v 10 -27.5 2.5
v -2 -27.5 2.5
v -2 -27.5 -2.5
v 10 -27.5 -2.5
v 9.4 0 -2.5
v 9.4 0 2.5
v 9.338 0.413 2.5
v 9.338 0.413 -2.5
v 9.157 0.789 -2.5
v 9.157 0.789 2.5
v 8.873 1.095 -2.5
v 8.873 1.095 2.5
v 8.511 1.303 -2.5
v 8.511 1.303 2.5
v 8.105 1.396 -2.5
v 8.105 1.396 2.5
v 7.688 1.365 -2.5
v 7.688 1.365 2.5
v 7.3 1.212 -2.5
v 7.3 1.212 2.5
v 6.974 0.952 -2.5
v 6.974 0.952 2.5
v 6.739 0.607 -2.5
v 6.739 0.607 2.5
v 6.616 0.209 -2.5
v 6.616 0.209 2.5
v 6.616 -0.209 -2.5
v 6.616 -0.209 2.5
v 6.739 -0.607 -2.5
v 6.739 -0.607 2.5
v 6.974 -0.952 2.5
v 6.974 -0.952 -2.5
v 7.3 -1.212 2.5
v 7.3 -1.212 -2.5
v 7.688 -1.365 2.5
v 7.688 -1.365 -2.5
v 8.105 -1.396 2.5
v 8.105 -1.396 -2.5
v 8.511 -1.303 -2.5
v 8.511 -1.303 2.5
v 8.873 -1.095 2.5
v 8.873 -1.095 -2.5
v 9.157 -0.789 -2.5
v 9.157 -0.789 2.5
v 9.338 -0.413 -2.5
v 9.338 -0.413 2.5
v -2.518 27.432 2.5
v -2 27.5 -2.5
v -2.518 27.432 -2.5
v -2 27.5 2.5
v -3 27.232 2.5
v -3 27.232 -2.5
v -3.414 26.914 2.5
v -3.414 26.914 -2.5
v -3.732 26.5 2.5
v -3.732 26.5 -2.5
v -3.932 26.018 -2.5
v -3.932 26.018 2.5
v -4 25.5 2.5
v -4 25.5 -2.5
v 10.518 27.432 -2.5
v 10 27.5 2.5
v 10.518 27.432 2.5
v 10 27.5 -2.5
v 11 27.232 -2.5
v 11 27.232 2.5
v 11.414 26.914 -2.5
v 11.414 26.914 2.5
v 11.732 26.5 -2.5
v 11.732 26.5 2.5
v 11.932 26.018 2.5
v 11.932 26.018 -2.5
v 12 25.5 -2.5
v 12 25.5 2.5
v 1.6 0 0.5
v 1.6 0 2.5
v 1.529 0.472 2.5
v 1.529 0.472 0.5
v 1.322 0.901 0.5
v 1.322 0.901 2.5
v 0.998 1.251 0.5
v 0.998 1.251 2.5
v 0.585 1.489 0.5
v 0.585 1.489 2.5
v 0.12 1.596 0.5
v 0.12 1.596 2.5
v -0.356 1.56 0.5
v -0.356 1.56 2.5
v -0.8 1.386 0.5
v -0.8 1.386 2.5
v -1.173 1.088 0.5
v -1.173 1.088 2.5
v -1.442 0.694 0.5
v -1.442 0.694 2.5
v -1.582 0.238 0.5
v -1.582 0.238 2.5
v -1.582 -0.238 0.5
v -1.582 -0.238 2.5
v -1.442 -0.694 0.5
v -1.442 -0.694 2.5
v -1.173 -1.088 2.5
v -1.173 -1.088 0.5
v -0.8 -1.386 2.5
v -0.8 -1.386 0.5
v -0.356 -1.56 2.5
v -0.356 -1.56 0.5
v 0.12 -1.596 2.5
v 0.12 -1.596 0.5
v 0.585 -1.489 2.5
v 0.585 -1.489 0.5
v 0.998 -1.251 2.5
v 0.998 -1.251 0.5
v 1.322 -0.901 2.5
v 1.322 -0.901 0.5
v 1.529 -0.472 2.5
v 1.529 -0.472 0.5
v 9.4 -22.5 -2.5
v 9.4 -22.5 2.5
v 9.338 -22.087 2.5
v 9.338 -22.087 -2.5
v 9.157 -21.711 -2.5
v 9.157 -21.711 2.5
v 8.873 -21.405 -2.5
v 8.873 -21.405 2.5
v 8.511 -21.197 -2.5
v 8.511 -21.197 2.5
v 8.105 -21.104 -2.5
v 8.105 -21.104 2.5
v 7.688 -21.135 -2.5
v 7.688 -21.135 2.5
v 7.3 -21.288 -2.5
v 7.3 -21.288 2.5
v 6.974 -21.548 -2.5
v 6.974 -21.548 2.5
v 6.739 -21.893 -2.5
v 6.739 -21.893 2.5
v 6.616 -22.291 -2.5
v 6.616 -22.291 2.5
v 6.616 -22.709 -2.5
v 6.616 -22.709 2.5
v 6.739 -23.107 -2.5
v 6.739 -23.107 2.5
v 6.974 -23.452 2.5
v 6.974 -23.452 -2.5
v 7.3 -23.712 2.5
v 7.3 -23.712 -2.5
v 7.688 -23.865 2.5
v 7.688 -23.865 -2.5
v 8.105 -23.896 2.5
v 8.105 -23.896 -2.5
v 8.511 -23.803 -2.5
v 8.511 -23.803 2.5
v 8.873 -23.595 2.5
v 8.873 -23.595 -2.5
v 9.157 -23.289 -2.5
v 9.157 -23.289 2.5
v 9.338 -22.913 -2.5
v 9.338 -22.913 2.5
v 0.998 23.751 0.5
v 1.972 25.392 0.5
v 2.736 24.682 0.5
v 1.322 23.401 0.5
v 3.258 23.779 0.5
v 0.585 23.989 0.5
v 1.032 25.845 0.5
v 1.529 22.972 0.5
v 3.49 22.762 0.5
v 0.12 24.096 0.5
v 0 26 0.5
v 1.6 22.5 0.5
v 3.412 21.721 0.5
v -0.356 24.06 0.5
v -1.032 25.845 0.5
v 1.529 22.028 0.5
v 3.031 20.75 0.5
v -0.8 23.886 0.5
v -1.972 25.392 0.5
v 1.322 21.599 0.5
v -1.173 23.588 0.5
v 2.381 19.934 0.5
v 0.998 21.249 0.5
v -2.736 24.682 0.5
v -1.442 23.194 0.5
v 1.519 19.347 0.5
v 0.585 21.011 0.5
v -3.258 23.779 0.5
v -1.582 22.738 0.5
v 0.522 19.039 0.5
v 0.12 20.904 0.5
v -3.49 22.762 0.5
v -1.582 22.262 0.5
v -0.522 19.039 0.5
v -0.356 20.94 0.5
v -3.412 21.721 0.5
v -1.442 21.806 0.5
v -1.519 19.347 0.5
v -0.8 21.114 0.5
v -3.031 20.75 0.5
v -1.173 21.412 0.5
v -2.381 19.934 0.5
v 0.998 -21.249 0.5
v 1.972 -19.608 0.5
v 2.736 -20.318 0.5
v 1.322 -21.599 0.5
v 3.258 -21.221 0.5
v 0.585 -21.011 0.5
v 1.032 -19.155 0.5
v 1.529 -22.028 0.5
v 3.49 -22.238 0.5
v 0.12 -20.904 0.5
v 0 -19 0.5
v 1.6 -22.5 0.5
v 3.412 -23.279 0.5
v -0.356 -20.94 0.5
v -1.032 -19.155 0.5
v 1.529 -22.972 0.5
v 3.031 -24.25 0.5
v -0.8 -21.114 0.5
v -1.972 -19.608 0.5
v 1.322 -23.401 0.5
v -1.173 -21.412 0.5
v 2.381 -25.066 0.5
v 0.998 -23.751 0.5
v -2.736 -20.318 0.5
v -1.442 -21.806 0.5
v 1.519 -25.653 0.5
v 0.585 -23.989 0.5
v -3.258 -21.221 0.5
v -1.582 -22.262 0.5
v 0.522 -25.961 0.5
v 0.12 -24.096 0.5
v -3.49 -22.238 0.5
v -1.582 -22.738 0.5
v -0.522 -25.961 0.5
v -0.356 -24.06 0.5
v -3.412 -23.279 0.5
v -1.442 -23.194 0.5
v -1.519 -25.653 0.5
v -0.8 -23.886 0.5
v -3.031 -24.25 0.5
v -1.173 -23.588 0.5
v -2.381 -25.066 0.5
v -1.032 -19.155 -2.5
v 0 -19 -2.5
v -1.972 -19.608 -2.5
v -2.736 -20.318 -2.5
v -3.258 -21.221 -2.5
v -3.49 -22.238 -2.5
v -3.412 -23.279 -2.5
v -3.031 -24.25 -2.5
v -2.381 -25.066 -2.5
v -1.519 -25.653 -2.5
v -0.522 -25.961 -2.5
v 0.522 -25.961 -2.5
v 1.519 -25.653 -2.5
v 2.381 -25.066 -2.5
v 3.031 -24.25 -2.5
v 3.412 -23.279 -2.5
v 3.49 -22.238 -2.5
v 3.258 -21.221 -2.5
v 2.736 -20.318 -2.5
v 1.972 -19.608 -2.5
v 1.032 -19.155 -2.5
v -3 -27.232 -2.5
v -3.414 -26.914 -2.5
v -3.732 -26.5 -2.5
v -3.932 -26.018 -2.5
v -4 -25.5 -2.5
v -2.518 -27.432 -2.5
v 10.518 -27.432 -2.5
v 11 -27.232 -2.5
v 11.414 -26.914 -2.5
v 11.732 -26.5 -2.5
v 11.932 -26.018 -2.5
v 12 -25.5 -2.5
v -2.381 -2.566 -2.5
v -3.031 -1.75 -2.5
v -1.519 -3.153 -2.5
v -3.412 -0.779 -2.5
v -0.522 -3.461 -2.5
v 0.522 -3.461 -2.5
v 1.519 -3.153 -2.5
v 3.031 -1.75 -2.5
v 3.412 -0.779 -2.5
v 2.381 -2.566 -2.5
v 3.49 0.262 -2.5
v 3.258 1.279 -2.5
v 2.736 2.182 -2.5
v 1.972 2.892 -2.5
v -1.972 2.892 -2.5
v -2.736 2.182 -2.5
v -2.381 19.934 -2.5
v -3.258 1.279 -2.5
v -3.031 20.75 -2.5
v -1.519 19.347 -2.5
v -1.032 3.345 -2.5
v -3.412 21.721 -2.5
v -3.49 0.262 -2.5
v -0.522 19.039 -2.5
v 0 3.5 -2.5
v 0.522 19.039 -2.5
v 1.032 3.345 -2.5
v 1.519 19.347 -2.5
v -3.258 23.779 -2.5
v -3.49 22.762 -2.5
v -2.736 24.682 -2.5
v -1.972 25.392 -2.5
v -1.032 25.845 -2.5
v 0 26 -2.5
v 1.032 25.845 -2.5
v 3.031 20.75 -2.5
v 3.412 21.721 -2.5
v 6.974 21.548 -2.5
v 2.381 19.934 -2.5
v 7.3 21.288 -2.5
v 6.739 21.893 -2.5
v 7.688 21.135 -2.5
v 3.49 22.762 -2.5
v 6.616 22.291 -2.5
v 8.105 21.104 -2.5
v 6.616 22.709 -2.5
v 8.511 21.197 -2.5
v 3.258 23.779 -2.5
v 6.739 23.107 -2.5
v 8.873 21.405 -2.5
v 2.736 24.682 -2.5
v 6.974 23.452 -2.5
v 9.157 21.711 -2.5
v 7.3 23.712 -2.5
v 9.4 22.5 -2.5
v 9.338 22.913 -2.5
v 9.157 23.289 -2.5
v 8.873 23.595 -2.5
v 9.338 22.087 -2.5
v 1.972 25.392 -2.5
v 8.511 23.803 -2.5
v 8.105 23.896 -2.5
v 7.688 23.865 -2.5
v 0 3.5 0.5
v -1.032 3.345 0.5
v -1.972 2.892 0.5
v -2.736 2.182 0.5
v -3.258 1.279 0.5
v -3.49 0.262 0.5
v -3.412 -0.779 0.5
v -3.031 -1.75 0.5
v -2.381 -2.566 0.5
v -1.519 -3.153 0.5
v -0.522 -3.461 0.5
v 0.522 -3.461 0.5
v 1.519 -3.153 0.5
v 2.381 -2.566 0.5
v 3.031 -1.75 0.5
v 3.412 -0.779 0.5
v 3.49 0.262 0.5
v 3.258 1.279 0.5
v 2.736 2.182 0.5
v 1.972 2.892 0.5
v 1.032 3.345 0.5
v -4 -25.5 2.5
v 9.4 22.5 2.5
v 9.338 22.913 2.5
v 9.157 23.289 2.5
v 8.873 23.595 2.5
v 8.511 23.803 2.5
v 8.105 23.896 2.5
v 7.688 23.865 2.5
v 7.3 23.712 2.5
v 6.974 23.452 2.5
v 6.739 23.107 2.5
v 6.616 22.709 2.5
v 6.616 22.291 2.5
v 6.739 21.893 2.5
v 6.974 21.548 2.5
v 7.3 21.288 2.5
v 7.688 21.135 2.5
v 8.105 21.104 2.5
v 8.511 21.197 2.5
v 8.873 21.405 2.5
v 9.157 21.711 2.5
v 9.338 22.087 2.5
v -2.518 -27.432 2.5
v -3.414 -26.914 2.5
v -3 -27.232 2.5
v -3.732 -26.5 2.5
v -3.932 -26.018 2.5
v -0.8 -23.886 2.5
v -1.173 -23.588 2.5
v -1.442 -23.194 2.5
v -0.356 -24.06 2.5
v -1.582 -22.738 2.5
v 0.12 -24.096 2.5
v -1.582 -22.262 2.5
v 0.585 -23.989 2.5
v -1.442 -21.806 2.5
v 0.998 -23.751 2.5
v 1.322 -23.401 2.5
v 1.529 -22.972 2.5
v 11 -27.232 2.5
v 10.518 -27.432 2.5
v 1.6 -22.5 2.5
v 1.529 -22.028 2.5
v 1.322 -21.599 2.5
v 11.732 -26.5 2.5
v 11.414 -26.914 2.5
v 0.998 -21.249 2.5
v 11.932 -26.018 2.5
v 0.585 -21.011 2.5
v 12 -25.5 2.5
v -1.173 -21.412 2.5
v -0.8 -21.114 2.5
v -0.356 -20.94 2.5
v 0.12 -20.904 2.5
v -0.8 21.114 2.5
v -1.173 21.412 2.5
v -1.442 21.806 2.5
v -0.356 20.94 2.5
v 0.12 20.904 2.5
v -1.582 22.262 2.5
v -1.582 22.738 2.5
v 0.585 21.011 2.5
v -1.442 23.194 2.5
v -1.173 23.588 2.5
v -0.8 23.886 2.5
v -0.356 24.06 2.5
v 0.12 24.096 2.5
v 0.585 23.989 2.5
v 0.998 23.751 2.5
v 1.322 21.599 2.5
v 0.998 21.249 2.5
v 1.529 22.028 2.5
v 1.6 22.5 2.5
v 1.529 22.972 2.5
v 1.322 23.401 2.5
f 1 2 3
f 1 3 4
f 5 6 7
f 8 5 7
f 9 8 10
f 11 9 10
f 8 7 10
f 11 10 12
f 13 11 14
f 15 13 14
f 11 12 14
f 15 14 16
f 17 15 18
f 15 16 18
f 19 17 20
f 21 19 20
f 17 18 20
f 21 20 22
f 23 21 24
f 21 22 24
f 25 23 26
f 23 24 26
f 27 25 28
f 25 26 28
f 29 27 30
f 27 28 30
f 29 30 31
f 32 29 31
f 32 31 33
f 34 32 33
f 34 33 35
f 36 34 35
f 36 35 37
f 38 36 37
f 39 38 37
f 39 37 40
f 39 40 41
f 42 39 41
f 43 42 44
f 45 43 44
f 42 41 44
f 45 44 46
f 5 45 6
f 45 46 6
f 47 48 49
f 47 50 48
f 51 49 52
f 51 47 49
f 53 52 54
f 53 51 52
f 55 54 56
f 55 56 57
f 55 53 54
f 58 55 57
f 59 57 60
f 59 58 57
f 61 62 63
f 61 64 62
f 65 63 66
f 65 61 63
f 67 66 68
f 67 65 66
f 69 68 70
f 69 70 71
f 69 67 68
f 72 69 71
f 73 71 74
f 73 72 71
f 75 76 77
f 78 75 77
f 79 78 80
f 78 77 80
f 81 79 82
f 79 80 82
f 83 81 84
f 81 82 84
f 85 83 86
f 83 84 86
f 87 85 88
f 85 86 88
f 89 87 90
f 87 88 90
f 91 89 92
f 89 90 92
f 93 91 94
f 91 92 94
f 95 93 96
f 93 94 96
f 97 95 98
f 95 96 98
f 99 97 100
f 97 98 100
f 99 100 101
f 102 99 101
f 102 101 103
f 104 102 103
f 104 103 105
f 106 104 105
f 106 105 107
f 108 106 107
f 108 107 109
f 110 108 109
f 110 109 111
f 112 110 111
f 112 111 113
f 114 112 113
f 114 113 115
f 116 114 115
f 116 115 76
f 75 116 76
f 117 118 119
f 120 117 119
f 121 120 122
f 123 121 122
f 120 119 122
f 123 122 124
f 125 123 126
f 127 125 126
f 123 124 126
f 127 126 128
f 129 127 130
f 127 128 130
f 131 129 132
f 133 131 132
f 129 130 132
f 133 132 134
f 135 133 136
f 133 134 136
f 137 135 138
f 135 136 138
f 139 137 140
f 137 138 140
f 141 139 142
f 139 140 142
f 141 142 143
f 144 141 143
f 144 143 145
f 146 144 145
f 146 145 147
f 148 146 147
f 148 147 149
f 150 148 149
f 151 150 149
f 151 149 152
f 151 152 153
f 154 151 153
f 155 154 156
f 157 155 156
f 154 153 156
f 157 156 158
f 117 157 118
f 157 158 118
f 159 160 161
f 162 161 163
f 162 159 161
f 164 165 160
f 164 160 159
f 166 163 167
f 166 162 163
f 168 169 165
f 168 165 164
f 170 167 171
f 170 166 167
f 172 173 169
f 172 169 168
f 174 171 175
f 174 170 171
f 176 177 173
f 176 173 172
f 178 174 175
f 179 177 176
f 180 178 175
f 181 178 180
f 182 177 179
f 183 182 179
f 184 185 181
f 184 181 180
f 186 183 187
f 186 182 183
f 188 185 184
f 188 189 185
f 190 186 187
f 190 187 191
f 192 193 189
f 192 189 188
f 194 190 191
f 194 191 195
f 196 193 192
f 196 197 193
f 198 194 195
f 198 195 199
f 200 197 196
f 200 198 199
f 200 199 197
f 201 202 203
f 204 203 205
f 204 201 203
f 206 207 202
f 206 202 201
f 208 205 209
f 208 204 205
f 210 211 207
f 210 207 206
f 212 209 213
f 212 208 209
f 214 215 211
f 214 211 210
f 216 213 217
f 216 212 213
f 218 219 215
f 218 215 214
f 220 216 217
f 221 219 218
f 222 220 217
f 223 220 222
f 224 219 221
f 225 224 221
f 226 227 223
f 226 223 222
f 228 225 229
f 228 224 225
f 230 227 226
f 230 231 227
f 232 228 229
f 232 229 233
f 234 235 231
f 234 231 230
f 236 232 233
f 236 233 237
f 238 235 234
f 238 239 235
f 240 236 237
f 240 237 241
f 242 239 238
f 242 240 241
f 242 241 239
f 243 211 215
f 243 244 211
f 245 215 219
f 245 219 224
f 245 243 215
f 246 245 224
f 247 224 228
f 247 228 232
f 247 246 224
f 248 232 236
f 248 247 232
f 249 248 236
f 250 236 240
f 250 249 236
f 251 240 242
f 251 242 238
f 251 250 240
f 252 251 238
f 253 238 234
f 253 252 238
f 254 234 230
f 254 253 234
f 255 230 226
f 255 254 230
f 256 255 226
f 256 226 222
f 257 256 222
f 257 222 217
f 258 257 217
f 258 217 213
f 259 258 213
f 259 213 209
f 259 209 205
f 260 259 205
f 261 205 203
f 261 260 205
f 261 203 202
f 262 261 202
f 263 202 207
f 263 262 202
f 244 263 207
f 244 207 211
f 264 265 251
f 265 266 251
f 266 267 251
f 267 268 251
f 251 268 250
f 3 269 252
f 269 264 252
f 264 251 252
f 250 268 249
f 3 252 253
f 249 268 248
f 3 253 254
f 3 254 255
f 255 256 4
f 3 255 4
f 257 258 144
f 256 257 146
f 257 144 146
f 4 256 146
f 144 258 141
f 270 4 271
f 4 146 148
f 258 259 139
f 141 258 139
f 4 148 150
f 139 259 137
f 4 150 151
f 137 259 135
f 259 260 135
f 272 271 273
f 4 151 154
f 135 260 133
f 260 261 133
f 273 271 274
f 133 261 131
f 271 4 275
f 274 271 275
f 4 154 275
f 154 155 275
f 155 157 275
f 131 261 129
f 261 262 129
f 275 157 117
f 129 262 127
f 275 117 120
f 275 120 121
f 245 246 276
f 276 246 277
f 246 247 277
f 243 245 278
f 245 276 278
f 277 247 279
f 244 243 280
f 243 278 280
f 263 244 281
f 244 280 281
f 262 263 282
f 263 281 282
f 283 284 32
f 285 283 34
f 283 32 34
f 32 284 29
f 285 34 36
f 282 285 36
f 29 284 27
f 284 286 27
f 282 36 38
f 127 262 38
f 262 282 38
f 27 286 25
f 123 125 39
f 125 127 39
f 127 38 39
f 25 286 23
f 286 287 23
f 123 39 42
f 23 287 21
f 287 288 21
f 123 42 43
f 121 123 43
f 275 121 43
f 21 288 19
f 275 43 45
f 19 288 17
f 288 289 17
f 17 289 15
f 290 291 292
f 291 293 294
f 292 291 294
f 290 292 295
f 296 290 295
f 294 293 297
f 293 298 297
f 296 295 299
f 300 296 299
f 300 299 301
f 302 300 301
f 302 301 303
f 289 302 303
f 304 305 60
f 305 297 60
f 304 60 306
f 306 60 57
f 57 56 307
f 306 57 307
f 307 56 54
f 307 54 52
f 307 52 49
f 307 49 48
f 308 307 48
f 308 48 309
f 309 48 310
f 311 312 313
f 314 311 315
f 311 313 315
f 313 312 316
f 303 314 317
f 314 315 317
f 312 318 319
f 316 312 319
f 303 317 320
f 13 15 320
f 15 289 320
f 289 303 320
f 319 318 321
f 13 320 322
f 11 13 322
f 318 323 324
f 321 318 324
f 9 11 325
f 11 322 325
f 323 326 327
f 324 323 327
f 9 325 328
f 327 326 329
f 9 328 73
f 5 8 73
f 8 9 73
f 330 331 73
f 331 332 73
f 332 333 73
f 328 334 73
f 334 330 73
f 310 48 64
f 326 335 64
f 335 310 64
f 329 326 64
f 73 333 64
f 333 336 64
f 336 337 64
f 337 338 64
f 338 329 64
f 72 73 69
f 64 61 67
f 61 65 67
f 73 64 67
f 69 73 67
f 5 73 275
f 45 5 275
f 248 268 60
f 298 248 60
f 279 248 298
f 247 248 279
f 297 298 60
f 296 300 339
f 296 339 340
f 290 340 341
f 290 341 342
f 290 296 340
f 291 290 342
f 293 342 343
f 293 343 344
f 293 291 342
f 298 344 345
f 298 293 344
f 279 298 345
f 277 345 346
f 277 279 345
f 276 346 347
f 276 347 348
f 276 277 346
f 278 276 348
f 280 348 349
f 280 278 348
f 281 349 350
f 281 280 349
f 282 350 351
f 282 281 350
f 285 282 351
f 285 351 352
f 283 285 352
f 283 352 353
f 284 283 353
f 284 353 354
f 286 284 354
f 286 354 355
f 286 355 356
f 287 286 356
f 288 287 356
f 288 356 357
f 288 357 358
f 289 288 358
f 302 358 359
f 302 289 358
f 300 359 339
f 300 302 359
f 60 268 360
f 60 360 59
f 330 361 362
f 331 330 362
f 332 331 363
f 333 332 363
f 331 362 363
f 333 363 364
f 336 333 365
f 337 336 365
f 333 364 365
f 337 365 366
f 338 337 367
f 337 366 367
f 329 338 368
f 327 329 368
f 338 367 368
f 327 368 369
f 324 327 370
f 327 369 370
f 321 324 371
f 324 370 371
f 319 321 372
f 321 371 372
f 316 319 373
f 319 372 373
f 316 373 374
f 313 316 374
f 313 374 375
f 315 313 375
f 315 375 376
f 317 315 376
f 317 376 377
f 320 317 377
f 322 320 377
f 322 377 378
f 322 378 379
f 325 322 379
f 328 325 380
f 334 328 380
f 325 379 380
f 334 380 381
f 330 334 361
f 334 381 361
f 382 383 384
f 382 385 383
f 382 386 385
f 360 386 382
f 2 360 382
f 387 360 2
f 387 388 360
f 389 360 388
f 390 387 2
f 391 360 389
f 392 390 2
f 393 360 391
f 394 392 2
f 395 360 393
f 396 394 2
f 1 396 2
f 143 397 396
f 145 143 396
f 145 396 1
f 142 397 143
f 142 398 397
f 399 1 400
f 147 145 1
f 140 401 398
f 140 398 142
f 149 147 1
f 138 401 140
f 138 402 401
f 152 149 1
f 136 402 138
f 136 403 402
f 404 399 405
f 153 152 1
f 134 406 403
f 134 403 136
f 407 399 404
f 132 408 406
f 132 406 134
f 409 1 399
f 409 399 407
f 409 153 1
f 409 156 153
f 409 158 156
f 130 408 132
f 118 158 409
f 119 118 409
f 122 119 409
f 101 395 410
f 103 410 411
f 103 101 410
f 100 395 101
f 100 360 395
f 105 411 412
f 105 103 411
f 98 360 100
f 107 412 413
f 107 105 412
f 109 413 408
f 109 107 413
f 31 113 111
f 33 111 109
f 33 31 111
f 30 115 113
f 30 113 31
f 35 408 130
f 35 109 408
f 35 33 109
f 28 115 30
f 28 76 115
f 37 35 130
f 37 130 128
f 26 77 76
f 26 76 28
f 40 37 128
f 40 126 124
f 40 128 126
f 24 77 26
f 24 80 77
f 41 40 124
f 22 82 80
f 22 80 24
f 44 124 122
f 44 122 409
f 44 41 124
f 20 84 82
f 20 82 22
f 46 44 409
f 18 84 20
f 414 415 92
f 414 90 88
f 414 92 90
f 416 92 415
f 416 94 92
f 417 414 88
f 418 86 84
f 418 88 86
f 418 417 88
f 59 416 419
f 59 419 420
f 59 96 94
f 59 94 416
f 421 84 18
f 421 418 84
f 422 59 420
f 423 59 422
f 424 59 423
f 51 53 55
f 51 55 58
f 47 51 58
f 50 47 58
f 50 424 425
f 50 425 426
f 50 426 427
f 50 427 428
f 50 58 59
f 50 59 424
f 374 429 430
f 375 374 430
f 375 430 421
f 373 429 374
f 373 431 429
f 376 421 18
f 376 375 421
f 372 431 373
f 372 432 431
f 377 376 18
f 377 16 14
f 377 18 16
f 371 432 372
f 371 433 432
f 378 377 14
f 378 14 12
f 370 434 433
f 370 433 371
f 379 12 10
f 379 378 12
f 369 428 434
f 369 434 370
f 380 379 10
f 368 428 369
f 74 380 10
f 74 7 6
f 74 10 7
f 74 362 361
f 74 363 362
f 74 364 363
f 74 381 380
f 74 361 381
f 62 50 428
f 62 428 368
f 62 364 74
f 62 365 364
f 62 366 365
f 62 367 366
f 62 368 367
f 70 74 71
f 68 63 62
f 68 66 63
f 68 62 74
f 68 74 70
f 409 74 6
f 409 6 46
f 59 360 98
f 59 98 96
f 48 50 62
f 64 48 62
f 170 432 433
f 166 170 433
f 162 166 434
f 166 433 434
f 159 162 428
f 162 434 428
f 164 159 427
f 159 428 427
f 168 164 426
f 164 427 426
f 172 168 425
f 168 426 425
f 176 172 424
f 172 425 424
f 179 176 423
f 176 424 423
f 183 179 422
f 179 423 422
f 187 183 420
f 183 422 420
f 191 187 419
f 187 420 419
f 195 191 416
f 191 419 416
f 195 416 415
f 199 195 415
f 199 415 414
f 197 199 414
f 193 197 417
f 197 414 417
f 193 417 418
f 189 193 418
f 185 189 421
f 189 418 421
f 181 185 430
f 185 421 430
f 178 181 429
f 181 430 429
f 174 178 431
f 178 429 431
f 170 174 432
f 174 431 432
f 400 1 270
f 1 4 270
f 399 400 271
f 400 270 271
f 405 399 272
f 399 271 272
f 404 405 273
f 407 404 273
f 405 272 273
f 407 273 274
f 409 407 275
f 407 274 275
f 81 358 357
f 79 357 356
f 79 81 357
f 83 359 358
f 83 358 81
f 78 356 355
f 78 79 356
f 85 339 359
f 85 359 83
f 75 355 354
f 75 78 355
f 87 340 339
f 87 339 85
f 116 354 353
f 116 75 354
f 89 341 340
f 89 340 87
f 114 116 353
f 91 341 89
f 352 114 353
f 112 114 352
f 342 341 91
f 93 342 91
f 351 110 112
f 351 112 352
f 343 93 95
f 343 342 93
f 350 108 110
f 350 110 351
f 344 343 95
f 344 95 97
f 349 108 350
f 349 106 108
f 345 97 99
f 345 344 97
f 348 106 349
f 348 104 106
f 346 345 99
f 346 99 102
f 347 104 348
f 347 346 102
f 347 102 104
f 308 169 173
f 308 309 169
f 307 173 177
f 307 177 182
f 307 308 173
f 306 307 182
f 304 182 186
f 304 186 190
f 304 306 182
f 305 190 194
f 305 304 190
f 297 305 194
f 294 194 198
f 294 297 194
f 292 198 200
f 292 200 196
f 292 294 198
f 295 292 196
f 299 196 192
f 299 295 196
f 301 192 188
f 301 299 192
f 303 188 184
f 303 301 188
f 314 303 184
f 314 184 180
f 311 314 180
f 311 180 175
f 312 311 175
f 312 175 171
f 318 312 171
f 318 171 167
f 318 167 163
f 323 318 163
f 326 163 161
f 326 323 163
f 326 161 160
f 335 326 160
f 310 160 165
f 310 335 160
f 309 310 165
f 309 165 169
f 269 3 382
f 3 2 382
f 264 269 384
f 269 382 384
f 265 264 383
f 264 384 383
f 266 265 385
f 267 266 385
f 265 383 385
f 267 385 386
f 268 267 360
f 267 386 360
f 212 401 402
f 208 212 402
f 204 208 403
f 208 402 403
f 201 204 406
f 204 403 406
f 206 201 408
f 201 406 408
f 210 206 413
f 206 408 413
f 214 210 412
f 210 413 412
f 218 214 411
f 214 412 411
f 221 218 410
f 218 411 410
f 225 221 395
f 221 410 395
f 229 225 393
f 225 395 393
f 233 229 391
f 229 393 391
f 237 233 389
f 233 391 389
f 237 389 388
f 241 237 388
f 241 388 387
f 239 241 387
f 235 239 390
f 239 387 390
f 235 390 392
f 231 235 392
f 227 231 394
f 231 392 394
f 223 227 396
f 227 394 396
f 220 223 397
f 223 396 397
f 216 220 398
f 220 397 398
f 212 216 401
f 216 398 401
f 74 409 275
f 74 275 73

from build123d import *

# Parameters (mm, degrees)
BOSS_EXTRUDE1_DEPTH                    = 2.5
BOSS_EXTRUDE1_DEPTH_BACK               = 2.5
SKETCH1_W                              = 8
SKETCH1_H                              = 55
SKETCH2_R                              = 1.6
CUT_EXTRUDE1_DEPTH                     = 29.235615807
SKETCH3_W                              = 8
SKETCH3_H                              = 55
SKETCH3_R                              = 1.4
BOSS_EXTRUDE3_DEPTH                    = 5
CBORE_FOR_M5_HEX_HEAD_BOLT3_AT_2_COUNT = 2
CBORE_FOR_M5_HEX_HEAD_BOLT3_AT_2_PITCH = 22.5
CBORE_FOR_M5_HEX_HEAD_BOLT3_AT_3_COUNT = 2
CBORE_FOR_M5_HEX_HEAD_BOLT3_AT_3_PITCH = 45
CBORE_FOR_M5_HEX_HEAD_BOLT3_AT_4_COUNT = 2
CBORE_FOR_M5_HEX_HEAD_BOLT3_AT_4_PITCH = 22.5
FILLET1_R                              = 2


with BuildPart() as part:
    # Sketch1 → Boss-Extrude1 (new, two sides: drawn at the far end of the back side and taken through both)
    with BuildSketch(Plane.XY.offset(-BOSS_EXTRUDE1_DEPTH_BACK)):
        Rectangle(SKETCH1_W, SKETCH1_H)
    extrude(amount=BOSS_EXTRUDE1_DEPTH + BOSS_EXTRUDE1_DEPTH_BACK)

    # Sketch2 → Cut-Extrude1 (cut, through all)
    with BuildSketch(Plane.XY.offset(2.5)):
        with Locations((0, 22.5)):
            Circle(SKETCH2_R)
        with Locations((0, -22.5)):
            Circle(SKETCH2_R)
        Circle(SKETCH2_R)
    extrude(amount=-CUT_EXTRUDE1_DEPTH, mode=Mode.SUBTRACT)

    # Sketch3 → Boss-Extrude3 (add, through all)
    with BuildSketch(Plane.XY.offset(2.5)):
        with Locations((8, 0)):
            Rectangle(SKETCH3_W, SKETCH3_H)
        with Locations((8, 22.5)):
            Circle(SKETCH3_R, mode=Mode.SUBTRACT)
        with Locations((8, 0)):
            Circle(SKETCH3_R, mode=Mode.SUBTRACT)
        with Locations((8, -22.5)):
            Circle(SKETCH3_R, mode=Mode.SUBTRACT)
    extrude(amount=-BOSS_EXTRUDE3_DEPTH)

    # Sketch8 → CBORE for M5 Hex Head Bolt3 (revolve, cut)
    with BuildSketch(Plane(origin=(0, 22.5, -2.5), x_dir=(0, 1, 0), z_dir=(1, 0, 0))):
        Polygon((0, 0), (0, 5), (1.6, 5), (1.6, 3), (3.5, 3), (3.5, 0), align=None)
    cbore_for_m5_hex_head_bolt3 = revolve(axis=Axis((0, 22.5, -8.85), (0, 0, 1)), mode=Mode.SUBTRACT)

    # CBORE for M5 Hex Head Bolt3 at 2: CBORE for M5 Hex Head Bolt3 ×2
    with Locations(*[(0, -i * CBORE_FOR_M5_HEX_HEAD_BOLT3_AT_2_PITCH, 0) for i in range(1, CBORE_FOR_M5_HEX_HEAD_BOLT3_AT_2_COUNT)]):
        add(cbore_for_m5_hex_head_bolt3, mode=Mode.SUBTRACT)

    # CBORE for M5 Hex Head Bolt3 at 3: CBORE for M5 Hex Head Bolt3 ×2
    with Locations(*[(0, -i * CBORE_FOR_M5_HEX_HEAD_BOLT3_AT_3_PITCH, 0) for i in range(1, CBORE_FOR_M5_HEX_HEAD_BOLT3_AT_3_COUNT)]):
        add(cbore_for_m5_hex_head_bolt3, mode=Mode.SUBTRACT)

    # CBORE for M5 Hex Head Bolt3 at 4: CBORE for M5 Hex Head Bolt3 ×2
    with Locations(*[(0, -i * CBORE_FOR_M5_HEX_HEAD_BOLT3_AT_4_PITCH, 0) for i in range(1, CBORE_FOR_M5_HEX_HEAD_BOLT3_AT_4_COUNT)]):
        add(cbore_for_m5_hex_head_bolt3, mode=Mode.SUBTRACT)

    # Fillet1
    fillet1_edges = [part.edges().sort_by_distance(p)[0] for p in [
        (12, 27.5, 0),
        (12, -27.5, 0),
        (-4, -27.5, 0),
        (-4, 27.5, 0),
    ]]
    fillet(fillet1_edges, radius=FILLET1_R)


solid = part.part
